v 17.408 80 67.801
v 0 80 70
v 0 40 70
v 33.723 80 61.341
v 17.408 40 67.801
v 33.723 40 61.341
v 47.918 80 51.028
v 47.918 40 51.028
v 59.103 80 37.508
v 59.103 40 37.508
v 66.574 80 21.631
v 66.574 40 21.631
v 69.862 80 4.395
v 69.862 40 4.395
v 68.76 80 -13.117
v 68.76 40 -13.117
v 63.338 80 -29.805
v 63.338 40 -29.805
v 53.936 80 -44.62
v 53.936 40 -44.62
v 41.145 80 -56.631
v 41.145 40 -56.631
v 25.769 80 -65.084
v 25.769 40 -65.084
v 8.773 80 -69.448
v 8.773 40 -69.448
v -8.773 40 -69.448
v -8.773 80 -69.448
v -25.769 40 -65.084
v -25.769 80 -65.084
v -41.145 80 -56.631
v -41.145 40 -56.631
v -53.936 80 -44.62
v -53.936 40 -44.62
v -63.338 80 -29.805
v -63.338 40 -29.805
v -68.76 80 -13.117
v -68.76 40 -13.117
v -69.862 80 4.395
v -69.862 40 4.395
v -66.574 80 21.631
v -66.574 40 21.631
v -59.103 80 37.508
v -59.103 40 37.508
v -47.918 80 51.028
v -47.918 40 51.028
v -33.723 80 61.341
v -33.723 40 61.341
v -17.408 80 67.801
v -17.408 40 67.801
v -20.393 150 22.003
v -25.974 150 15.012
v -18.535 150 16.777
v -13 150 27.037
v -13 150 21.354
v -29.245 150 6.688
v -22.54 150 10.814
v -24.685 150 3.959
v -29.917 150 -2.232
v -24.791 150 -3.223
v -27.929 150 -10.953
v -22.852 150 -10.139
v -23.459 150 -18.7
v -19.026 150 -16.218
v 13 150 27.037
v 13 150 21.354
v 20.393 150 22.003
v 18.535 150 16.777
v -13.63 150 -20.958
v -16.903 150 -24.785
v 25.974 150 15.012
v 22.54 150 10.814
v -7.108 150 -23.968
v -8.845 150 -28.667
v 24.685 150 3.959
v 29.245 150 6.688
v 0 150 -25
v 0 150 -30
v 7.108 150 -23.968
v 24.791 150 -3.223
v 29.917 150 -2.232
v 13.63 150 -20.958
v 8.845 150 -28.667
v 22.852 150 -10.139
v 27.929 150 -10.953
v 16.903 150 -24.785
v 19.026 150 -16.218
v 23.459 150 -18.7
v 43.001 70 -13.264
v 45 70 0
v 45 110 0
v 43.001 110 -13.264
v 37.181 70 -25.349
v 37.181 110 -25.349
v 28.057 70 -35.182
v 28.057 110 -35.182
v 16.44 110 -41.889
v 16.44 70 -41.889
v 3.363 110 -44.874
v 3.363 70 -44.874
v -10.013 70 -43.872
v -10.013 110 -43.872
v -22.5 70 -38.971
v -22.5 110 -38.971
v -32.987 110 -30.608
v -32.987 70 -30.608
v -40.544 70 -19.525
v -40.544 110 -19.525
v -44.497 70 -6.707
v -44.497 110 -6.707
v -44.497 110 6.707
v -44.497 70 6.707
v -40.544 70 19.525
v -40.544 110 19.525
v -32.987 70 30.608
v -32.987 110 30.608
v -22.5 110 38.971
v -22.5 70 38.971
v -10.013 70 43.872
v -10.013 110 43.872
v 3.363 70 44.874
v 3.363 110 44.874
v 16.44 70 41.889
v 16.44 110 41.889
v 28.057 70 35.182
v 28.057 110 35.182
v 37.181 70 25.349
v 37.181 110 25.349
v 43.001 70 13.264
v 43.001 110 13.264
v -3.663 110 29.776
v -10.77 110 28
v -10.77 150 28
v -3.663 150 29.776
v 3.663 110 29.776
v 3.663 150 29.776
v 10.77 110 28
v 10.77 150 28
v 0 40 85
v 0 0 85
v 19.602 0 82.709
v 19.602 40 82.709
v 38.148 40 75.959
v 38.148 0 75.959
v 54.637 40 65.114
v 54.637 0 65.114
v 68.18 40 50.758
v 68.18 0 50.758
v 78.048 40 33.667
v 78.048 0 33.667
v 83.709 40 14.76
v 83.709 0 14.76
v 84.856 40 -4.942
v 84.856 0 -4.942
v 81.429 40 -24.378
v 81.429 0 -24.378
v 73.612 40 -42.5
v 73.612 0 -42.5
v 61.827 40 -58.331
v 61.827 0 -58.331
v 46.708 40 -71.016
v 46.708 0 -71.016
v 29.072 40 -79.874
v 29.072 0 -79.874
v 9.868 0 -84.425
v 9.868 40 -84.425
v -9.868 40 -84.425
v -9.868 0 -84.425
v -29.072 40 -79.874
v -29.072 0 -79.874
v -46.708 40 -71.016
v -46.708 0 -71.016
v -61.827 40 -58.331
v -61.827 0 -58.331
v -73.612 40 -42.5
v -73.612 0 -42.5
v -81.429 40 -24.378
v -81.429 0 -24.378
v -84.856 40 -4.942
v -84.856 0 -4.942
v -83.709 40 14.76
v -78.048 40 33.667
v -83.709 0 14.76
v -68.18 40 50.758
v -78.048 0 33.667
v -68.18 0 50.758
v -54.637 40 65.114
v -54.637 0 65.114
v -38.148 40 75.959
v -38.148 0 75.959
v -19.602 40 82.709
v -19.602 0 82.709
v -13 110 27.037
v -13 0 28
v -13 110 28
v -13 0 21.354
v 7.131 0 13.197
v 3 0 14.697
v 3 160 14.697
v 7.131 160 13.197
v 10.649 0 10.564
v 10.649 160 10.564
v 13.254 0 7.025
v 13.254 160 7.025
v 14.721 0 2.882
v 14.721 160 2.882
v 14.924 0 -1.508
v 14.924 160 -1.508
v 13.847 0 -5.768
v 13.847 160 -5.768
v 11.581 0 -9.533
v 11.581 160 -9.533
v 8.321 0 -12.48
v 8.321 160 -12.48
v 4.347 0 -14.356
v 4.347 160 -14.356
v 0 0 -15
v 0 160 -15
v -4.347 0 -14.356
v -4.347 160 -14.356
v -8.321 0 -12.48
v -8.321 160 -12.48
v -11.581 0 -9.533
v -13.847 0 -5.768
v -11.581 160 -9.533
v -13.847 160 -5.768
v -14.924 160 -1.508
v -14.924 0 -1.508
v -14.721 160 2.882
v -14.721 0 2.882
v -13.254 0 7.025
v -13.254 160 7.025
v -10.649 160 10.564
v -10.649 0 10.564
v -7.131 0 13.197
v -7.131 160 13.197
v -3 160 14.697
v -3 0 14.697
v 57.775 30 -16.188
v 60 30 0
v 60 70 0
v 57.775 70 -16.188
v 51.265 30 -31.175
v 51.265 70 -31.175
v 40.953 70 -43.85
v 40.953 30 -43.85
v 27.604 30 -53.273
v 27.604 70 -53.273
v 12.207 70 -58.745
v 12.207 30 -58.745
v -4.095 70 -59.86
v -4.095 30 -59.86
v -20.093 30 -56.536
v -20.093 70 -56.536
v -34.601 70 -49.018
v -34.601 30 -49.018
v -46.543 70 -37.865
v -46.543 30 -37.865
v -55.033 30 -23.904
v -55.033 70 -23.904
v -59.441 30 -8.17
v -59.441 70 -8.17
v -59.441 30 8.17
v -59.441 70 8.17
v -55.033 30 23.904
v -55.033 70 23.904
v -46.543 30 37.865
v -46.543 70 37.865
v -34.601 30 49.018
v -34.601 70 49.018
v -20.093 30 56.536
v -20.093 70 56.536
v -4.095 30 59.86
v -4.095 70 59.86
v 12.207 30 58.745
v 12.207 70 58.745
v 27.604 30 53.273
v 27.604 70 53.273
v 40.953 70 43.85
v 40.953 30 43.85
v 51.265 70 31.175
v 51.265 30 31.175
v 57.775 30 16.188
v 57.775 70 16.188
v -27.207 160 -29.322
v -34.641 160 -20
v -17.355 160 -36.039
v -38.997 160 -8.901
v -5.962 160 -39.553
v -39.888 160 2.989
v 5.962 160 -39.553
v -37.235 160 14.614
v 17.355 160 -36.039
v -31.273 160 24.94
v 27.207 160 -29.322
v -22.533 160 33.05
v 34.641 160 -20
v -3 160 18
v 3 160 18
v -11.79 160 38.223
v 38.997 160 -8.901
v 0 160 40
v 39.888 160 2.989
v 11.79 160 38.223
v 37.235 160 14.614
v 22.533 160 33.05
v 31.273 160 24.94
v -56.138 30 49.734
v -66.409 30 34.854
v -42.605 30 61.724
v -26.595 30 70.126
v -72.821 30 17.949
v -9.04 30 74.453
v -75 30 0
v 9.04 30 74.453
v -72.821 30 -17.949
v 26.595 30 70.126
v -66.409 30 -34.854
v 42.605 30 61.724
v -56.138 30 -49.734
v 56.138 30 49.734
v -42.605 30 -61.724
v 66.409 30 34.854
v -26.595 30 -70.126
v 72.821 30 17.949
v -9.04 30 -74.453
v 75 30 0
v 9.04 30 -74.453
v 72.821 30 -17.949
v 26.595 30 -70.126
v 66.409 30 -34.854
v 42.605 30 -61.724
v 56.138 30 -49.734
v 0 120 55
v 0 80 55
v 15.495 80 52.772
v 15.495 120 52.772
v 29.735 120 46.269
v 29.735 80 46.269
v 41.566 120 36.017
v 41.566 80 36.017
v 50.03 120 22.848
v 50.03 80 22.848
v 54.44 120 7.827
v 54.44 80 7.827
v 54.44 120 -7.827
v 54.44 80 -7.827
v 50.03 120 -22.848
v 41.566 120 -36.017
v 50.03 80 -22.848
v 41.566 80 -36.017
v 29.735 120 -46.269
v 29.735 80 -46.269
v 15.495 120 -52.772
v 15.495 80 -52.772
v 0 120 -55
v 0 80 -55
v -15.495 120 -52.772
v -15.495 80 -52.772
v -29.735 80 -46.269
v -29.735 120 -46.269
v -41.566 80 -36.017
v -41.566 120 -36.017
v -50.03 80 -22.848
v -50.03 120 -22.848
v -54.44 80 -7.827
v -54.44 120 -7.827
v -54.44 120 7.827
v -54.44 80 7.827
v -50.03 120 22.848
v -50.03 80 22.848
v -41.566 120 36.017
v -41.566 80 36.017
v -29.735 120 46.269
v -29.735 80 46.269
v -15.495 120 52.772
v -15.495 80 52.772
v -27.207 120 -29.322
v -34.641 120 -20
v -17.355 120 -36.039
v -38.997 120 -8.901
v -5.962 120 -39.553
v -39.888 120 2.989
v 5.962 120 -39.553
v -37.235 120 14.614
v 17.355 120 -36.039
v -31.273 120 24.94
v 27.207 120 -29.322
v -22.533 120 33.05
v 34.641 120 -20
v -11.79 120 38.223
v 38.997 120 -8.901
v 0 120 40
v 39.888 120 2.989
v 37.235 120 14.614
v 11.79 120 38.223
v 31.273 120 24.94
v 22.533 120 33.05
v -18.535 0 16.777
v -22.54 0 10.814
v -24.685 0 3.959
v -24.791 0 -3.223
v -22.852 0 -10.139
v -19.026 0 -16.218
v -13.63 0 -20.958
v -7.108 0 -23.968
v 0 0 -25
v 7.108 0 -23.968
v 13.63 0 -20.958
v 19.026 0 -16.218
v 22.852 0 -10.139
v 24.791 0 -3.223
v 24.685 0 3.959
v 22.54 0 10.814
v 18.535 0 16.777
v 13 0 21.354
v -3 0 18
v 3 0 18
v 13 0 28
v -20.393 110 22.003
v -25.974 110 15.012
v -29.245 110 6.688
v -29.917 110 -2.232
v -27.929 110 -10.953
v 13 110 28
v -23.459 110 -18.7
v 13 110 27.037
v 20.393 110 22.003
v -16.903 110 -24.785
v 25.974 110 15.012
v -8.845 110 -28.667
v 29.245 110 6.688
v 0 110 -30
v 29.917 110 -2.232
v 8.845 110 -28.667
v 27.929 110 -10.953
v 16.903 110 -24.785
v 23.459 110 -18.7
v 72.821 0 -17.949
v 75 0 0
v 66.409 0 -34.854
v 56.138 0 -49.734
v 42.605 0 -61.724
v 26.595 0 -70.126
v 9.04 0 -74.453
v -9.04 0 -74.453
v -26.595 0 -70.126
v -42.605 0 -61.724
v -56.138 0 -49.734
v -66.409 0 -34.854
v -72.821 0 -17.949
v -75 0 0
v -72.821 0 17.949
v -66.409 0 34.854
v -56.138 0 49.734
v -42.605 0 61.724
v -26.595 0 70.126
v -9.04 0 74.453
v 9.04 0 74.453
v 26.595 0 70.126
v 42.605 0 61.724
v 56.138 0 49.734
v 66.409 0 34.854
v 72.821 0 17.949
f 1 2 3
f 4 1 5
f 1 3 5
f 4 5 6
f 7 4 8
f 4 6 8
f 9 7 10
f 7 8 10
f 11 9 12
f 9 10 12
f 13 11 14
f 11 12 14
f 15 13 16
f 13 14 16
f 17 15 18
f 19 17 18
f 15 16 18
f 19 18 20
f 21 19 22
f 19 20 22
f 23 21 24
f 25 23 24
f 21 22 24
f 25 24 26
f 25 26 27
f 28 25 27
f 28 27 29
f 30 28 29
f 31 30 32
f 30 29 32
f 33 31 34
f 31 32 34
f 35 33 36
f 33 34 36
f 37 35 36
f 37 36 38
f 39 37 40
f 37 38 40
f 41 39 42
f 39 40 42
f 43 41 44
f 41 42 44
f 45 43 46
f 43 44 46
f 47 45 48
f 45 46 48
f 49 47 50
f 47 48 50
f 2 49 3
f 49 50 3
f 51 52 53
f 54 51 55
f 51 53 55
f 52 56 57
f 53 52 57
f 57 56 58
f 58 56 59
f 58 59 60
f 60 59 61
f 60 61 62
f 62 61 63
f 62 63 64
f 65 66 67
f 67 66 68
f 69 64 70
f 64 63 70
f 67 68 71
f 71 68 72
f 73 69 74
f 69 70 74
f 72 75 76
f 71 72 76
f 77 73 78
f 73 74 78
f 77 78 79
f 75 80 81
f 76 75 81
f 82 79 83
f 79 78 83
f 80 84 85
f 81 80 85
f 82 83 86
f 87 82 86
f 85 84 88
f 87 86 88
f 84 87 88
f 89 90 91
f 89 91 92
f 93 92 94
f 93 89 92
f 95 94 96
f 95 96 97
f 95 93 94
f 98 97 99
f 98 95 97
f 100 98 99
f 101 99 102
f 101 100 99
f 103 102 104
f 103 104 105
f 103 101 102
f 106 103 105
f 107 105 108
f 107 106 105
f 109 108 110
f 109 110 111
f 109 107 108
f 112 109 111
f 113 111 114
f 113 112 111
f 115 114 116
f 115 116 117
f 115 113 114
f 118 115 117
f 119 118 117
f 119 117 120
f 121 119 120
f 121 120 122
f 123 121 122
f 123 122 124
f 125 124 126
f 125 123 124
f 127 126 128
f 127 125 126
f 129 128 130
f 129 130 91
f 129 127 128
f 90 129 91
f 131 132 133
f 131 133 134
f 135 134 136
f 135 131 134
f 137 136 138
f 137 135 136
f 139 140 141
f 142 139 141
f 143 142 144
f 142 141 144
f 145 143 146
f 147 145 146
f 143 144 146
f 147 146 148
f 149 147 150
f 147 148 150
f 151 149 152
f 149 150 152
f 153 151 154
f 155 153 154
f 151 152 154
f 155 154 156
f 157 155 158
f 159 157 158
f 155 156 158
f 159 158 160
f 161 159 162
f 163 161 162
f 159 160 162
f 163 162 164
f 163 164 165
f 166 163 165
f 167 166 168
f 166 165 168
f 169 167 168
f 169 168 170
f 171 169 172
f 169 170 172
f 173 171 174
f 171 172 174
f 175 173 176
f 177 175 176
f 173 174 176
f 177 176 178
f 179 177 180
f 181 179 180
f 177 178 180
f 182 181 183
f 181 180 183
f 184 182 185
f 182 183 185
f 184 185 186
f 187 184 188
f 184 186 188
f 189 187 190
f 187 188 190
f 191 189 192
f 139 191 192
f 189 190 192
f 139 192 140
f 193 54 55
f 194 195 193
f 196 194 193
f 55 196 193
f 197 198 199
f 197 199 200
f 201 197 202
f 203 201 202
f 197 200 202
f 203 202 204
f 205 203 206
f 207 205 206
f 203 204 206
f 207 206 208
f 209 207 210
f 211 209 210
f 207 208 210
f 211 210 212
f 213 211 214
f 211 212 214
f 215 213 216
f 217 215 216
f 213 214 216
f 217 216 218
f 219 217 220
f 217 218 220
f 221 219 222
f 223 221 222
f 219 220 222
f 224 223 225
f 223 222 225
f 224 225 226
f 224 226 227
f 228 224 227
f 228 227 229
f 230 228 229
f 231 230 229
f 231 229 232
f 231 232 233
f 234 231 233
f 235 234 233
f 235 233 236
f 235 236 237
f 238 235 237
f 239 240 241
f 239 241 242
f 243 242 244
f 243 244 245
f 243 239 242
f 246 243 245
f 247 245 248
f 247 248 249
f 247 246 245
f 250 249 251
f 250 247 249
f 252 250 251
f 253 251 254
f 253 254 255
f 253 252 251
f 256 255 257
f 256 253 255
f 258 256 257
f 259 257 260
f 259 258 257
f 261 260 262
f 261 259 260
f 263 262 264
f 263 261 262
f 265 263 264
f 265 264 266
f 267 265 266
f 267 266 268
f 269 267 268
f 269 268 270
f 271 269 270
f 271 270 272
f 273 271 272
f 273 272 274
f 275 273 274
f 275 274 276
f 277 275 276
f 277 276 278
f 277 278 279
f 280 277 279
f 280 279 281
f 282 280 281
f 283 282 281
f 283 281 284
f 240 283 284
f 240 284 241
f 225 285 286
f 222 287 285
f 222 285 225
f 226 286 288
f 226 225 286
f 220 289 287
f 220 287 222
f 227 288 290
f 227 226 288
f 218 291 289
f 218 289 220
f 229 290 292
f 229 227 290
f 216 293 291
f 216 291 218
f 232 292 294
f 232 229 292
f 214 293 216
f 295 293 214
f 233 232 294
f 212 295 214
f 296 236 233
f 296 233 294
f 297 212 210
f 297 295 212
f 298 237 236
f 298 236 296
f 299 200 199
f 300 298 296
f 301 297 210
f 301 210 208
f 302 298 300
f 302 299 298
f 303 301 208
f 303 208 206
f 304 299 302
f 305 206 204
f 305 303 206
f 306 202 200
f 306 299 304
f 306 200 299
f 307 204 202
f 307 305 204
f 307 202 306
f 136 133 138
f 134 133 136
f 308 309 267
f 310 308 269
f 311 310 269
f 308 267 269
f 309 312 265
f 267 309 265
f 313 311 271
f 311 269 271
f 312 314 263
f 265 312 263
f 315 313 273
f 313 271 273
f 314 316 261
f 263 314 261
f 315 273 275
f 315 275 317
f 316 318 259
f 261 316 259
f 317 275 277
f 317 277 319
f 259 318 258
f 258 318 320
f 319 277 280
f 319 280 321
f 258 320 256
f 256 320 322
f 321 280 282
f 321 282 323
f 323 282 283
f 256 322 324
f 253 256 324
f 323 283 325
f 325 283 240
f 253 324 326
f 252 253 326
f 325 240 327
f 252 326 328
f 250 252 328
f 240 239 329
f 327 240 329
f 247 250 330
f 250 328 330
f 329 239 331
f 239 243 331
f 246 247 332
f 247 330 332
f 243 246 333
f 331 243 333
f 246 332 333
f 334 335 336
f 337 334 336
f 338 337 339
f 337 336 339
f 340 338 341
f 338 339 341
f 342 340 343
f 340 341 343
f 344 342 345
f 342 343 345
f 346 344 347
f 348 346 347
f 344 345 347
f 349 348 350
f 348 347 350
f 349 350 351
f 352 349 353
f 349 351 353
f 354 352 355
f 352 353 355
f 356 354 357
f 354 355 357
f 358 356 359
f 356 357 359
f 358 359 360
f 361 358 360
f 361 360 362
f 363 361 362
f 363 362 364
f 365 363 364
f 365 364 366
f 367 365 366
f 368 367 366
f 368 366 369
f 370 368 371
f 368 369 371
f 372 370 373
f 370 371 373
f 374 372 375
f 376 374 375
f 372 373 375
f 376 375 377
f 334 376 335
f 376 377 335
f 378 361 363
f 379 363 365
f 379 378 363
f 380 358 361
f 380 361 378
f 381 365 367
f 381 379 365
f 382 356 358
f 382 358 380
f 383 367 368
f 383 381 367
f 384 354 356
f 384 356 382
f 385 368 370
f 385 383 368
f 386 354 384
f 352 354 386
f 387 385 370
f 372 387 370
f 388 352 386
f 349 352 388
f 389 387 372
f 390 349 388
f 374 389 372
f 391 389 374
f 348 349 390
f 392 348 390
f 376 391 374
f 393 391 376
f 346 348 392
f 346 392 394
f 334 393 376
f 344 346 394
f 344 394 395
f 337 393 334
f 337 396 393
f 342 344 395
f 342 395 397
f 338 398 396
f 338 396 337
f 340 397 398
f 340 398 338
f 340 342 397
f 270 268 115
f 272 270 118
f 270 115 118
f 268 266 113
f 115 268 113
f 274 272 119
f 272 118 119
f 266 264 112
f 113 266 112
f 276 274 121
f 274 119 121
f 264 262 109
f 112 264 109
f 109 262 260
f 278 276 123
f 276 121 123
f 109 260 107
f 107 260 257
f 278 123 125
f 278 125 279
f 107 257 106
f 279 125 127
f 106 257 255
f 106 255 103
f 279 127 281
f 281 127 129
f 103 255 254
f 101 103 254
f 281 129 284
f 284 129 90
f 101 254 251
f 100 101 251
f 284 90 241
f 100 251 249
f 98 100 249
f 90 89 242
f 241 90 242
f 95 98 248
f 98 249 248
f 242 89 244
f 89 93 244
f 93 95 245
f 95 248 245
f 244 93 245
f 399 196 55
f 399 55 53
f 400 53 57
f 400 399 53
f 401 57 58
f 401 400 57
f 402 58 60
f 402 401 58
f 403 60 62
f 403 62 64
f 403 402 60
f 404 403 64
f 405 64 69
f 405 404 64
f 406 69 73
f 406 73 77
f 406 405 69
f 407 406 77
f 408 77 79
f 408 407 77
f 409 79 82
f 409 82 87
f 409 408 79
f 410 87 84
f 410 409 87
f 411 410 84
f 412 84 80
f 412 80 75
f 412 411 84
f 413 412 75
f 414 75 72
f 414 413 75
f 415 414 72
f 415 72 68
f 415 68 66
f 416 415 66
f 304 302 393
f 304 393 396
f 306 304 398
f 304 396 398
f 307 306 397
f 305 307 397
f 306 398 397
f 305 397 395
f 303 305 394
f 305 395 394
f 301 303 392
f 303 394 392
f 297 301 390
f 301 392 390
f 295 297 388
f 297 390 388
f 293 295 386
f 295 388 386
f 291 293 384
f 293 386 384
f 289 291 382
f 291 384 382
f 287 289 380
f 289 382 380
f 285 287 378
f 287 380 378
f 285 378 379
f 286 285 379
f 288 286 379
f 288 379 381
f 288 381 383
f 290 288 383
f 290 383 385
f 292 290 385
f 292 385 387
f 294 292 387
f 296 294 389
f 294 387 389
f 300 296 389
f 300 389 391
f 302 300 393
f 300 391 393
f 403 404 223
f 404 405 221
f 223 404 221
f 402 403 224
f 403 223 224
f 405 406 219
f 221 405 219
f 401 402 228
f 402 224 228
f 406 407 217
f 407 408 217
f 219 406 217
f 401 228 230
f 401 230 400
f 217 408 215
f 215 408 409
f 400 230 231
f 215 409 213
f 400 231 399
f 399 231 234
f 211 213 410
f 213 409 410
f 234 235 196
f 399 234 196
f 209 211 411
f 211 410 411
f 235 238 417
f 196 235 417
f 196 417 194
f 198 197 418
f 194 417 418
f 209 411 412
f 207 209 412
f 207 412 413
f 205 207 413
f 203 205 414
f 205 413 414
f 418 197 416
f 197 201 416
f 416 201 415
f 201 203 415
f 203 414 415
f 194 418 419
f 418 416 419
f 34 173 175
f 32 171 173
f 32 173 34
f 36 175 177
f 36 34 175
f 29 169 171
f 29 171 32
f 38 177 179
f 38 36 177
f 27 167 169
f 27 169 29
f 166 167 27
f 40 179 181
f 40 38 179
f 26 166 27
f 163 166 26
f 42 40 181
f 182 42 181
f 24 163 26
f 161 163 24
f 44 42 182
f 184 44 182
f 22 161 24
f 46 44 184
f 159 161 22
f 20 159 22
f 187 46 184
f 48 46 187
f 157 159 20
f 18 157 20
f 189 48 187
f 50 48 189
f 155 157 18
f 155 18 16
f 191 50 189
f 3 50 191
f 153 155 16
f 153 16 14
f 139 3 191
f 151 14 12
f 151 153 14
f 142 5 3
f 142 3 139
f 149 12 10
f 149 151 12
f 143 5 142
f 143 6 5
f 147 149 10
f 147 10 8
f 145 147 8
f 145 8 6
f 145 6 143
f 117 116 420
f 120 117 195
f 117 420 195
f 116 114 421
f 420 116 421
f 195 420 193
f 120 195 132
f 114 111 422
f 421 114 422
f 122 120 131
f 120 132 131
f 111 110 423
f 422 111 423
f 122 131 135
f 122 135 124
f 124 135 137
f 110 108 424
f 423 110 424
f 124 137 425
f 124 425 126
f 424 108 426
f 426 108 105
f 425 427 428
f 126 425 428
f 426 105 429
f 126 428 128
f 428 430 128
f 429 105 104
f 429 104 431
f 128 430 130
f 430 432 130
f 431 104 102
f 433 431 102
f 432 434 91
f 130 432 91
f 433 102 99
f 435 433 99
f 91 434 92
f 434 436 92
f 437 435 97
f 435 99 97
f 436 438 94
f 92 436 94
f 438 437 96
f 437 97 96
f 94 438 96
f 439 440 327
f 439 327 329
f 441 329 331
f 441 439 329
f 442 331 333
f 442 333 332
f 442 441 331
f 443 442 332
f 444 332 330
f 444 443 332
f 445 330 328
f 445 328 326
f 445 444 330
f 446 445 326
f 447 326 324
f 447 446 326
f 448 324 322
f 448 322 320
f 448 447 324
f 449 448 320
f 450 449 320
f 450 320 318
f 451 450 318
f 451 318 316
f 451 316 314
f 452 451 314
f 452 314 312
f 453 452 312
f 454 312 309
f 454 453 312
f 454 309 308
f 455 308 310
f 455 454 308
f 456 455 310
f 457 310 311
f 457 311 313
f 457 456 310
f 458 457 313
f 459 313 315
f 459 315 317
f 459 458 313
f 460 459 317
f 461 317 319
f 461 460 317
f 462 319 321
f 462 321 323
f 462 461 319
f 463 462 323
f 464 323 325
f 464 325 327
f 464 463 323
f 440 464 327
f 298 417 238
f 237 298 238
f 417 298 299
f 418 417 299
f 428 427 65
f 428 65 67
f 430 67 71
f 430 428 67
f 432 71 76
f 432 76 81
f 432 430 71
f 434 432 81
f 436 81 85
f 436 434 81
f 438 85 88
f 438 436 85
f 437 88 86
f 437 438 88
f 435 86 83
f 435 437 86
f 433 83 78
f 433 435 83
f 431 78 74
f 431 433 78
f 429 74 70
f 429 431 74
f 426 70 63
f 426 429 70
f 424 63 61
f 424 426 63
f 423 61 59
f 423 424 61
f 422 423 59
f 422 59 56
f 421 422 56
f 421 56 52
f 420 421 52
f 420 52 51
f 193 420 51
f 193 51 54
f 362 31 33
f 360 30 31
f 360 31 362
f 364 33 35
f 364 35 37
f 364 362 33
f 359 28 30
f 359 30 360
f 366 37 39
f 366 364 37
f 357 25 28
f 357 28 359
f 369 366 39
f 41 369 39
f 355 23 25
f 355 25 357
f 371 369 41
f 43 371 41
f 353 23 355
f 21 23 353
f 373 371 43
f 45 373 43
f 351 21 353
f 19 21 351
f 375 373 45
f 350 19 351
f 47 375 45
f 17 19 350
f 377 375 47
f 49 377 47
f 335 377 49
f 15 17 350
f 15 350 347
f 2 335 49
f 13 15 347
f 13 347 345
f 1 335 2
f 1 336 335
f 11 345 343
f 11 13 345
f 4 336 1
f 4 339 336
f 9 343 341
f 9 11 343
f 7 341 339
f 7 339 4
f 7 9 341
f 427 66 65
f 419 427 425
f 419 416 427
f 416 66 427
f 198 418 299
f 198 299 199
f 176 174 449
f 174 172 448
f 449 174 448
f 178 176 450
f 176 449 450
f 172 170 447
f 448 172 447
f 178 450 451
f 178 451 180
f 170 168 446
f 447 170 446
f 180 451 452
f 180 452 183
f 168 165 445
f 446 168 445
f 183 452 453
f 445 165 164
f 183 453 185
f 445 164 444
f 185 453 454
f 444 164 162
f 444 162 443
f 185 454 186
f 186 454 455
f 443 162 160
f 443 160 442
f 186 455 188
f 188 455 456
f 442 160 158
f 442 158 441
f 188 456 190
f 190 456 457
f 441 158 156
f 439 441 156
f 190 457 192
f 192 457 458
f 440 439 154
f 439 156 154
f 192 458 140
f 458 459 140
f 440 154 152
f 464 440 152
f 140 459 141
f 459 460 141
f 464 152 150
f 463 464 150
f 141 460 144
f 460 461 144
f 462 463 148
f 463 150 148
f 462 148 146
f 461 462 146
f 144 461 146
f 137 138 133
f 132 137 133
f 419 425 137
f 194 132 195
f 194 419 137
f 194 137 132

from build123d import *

# Parameters (mm, degrees)
SKETCH1_R            = 85
BOSS_EXTRUDE1_DEPTH  = 40
SKETCH2_R            = 70
BOSS_EXTRUDE2_DEPTH  = 40
SKETCH3_R            = 55
BOSS_EXTRUDE3_DEPTH  = 40
SKETCH4_R            = 40
BOSS_EXTRUDE4_DEPTH  = 40
SKETCH5_R            = 15
SKETCH5_W            = 6
SKETCH5_H            = 6
CUT_EXTRUDE1_DEPTH   = 201.124960962
SHELL1_OUTLINE_R     = 60
SHELL1_DEPTH         = 70
SHELL1_2_OUTLINE_R   = 75
SHELL1_2_OUTLINE_R_2 = 60
SHELL1_2_DEPTH       = 30
SHELL1_START         = 70
SHELL1_3_OUTLINE_R   = 45
SHELL1_3_DEPTH       = 40
SHELL1_START_2       = 110
SHELL1_4_DEPTH       = 40


# Read off the part's stored shape, not the designer's step: Shell1
with BuildPart() as part:
    # Sketch1 → Boss-Extrude1 (new body)
    with BuildSketch(Plane(origin=(0, 0, 0), x_dir=(1, 0, 0), z_dir=(0, 1, 0))):
        with Locations(Location((0, 0, 0), (0, 0, 270))):
            Circle(SKETCH1_R)
    extrude(amount=BOSS_EXTRUDE1_DEPTH)

    # Sketch2 → Boss-Extrude2 (add)
    with BuildSketch(Plane(origin=(0, 40, 0), x_dir=(1, 0, 0), z_dir=(0, 1, 0))):
        with Locations(Location((0, 0, 0), (0, 0, 270))):
            Circle(SKETCH2_R)
    extrude(amount=BOSS_EXTRUDE2_DEPTH)

    # Sketch3 → Boss-Extrude3 (add)
    with BuildSketch(Plane(origin=(0, 80, 0), x_dir=(1, 0, 0), z_dir=(0, 1, 0))):
        with Locations(Location((0, 0, 0), (0, 0, 270))):
            Circle(SKETCH3_R)
    extrude(amount=BOSS_EXTRUDE3_DEPTH)

    # Sketch4 → Boss-Extrude4 (add)
    with BuildSketch(Plane(origin=(0, 120, 0), x_dir=(1, 0, 0), z_dir=(0, 1, 0))):
        with Locations(Location((0, 0, 0), (0, 0, 270))):
            Circle(SKETCH4_R)
    extrude(amount=BOSS_EXTRUDE4_DEPTH)

    # Sketch5 → Cut-Extrude1 (cut, through all)
    with BuildSketch(Plane(origin=(0, 160, 0), x_dir=(1, 0, 0), z_dir=(0, 1, 0))):
        Circle(SKETCH5_R)
        with Locations((0, -15)):
            Rectangle(SKETCH5_W, SKETCH5_H)
    extrude(amount=-CUT_EXTRUDE1_DEPTH, mode=Mode.SUBTRACT)

    # Shell1 outline → Shell1 (cut)
    with BuildSketch(Plane(origin=(0, 0, 0), x_dir=(1, 0, 0), z_dir=(0, 1, 0))):
        Circle(SHELL1_OUTLINE_R)
        with BuildLine():
            Line((13, -21.354156504), (13, -28))
            Line((13, -28), (-13, -28))
            Line((-13, -28), (-13, -21.354156504))
            ThreePointArc((-13, -21.354156504), (0, 25), (13, -21.354156504))
        make_face(mode=Mode.SUBTRACT)
    extrude(amount=SHELL1_DEPTH, mode=Mode.SUBTRACT)

    # Shell1 2 outline → Shell1 2 (cut)
    with BuildSketch(Plane(origin=(0, 0, 0), x_dir=(1, 0, 0), z_dir=(0, 1, 0))):
        Circle(SHELL1_2_OUTLINE_R)
        Circle(SHELL1_2_OUTLINE_R_2, mode=Mode.SUBTRACT)
    extrude(amount=SHELL1_2_DEPTH, mode=Mode.SUBTRACT)

    # Shell1 3 outline → Shell1 3 (cut)
    with BuildSketch(Plane(origin=(0, 0, 0), x_dir=(1, 0, 0), z_dir=(0, 1, 0)).offset(SHELL1_START)):
        Circle(SHELL1_3_OUTLINE_R)
        with BuildLine():
            Line((13, -21.354156504), (13, -28))
            Line((13, -28), (-13, -28))
            Line((-13, -28), (-13, -21.354156504))
            ThreePointArc((-13, -21.354156504), (0, 25), (13, -21.354156504))
        make_face(mode=Mode.SUBTRACT)
    extrude(amount=SHELL1_3_DEPTH, mode=Mode.SUBTRACT)

    # Shell1 4 outline → Shell1 4 (cut)
    with BuildSketch(Plane(origin=(0, 0, 0), x_dir=(1, 0, 0), z_dir=(0, 1, 0)).offset(SHELL1_START_2)):
        with BuildLine():
            Line((13, -21.354156504), (13, -27.037011669))
            ThreePointArc((13, -27.037011669), (0, 30), (-13, -27.037011669))
            Line((-13, -27.037011669), (-13, -21.354156504))
            ThreePointArc((-13, -21.354156504), (0, 25), (13, -21.354156504))
        make_face()
        with BuildLine():
            ThreePointArc((-10.770329614, -28), (0, -30), (10.770329614, -28))
            Line((10.770329614, -28), (-10.770329614, -28))
        make_face()
    extrude(amount=SHELL1_4_DEPTH, mode=Mode.SUBTRACT)


solid = part.part
